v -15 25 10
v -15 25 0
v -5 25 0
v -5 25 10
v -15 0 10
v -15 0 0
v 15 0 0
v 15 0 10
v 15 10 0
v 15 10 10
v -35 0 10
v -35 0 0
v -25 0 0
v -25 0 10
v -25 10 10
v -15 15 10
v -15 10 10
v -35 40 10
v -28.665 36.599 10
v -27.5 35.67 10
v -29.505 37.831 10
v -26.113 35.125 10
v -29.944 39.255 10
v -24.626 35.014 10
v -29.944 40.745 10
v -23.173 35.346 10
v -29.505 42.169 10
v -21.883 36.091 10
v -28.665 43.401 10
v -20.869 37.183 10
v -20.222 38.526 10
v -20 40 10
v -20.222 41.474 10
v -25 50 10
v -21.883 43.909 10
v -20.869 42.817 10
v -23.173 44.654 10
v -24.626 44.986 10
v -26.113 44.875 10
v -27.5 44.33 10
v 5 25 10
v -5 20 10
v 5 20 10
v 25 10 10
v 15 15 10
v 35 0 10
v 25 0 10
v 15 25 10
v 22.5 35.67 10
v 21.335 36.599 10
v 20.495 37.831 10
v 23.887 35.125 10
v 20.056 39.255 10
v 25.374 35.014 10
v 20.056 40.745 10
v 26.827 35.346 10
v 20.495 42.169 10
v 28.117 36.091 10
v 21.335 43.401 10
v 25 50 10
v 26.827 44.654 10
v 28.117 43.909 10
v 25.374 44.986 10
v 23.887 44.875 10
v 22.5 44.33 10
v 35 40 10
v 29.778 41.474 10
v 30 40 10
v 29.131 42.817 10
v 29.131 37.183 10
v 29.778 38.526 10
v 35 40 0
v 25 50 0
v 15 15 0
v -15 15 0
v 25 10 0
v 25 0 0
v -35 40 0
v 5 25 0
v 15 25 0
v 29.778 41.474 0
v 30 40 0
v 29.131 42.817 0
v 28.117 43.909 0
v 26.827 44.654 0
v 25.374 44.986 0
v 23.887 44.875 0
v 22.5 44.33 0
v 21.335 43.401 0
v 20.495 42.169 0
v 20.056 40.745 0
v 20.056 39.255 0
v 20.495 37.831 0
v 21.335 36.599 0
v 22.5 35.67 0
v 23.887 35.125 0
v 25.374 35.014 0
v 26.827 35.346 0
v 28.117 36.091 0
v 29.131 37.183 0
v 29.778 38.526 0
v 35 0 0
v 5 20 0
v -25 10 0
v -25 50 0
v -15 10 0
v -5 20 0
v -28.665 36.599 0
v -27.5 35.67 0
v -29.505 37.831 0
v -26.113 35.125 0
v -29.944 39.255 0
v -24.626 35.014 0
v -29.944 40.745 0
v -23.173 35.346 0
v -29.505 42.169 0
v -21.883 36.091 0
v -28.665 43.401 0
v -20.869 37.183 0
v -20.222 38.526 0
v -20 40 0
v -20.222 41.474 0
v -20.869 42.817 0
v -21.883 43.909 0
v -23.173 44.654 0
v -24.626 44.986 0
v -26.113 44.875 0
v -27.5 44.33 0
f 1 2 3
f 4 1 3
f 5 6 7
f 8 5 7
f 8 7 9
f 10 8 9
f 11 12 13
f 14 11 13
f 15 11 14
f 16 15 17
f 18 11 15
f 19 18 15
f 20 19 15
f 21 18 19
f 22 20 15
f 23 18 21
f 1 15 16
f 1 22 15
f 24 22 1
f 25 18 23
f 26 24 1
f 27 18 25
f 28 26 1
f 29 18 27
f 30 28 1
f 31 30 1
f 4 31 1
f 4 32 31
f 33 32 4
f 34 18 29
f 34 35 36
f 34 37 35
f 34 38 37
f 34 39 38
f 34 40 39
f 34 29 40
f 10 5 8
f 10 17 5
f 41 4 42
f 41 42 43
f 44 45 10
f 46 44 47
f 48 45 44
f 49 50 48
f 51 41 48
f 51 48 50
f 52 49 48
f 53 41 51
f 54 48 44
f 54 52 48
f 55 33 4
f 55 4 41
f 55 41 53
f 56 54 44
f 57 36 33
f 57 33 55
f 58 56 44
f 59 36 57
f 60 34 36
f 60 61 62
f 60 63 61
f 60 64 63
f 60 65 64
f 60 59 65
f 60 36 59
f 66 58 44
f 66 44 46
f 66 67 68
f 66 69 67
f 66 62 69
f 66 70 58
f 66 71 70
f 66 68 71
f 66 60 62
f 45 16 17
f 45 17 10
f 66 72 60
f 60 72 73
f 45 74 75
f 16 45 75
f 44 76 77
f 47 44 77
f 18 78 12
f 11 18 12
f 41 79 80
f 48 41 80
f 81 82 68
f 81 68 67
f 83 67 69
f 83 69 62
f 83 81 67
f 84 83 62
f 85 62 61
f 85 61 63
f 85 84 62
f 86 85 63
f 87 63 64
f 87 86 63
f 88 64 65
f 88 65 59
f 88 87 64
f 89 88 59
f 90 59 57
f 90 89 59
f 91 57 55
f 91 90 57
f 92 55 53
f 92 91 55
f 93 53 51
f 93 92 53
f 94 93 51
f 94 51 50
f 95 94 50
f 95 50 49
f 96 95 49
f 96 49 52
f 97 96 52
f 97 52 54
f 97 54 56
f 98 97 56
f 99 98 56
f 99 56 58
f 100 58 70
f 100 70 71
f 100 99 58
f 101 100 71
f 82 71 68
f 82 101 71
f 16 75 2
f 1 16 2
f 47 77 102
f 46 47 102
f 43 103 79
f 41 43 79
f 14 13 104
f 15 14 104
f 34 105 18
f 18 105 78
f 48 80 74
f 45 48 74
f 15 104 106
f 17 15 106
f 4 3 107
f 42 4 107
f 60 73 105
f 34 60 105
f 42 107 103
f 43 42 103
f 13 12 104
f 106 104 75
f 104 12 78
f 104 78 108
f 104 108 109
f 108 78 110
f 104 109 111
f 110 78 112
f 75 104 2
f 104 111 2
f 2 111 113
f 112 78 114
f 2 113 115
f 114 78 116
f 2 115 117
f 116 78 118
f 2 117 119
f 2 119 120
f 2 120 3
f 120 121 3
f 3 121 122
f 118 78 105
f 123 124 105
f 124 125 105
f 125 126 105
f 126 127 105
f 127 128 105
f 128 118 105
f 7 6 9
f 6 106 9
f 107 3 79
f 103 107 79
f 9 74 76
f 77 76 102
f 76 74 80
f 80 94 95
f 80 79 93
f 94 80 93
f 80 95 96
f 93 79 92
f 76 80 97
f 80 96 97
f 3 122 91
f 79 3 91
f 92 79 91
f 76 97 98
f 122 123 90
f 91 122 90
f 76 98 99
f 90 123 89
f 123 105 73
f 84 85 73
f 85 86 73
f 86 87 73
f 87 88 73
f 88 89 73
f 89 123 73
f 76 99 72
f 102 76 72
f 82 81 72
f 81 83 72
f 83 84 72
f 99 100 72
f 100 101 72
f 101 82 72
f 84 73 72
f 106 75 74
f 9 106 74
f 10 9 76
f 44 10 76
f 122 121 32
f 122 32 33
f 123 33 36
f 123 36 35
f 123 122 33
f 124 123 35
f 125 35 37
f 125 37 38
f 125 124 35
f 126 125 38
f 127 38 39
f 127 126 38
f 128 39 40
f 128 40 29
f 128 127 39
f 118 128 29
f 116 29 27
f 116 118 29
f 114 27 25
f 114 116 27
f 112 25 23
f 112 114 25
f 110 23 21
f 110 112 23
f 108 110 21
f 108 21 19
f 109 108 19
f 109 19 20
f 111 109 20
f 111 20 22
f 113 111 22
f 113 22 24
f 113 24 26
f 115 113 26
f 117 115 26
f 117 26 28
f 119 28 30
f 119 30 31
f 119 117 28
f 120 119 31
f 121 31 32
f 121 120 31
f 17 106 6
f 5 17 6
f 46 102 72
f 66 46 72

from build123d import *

# Parameters (mm, degrees)
SKETCH1_R           = 5
BOSS_EXTRUDE1_DEPTH = 10


with BuildPart() as part:
    # Sketch1 → Boss-Extrude1 (new body)
    with BuildSketch(Plane.XY):
        Polygon((-15, 0), (15, 0), (15, 10), (25, 10), (25, 0), (35, 0), (35, 40), (25, 50), (-25, 50), (-35, 40), (-35, 0), (-25, 0), (-25, 10), (-15, 10), align=None)
        with Locations((25, 40)):
            Circle(SKETCH1_R, mode=Mode.SUBTRACT)
        with Locations((-25, 40)):
            Circle(SKETCH1_R, mode=Mode.SUBTRACT)
        Polygon((-5, 20), (5, 20), (5, 25), (15, 25), (15, 15), (-15, 15), (-15, 25), (-5, 25), align=None, mode=Mode.SUBTRACT)
    extrude(amount=BOSS_EXTRUDE1_DEPTH)


solid = part.part
